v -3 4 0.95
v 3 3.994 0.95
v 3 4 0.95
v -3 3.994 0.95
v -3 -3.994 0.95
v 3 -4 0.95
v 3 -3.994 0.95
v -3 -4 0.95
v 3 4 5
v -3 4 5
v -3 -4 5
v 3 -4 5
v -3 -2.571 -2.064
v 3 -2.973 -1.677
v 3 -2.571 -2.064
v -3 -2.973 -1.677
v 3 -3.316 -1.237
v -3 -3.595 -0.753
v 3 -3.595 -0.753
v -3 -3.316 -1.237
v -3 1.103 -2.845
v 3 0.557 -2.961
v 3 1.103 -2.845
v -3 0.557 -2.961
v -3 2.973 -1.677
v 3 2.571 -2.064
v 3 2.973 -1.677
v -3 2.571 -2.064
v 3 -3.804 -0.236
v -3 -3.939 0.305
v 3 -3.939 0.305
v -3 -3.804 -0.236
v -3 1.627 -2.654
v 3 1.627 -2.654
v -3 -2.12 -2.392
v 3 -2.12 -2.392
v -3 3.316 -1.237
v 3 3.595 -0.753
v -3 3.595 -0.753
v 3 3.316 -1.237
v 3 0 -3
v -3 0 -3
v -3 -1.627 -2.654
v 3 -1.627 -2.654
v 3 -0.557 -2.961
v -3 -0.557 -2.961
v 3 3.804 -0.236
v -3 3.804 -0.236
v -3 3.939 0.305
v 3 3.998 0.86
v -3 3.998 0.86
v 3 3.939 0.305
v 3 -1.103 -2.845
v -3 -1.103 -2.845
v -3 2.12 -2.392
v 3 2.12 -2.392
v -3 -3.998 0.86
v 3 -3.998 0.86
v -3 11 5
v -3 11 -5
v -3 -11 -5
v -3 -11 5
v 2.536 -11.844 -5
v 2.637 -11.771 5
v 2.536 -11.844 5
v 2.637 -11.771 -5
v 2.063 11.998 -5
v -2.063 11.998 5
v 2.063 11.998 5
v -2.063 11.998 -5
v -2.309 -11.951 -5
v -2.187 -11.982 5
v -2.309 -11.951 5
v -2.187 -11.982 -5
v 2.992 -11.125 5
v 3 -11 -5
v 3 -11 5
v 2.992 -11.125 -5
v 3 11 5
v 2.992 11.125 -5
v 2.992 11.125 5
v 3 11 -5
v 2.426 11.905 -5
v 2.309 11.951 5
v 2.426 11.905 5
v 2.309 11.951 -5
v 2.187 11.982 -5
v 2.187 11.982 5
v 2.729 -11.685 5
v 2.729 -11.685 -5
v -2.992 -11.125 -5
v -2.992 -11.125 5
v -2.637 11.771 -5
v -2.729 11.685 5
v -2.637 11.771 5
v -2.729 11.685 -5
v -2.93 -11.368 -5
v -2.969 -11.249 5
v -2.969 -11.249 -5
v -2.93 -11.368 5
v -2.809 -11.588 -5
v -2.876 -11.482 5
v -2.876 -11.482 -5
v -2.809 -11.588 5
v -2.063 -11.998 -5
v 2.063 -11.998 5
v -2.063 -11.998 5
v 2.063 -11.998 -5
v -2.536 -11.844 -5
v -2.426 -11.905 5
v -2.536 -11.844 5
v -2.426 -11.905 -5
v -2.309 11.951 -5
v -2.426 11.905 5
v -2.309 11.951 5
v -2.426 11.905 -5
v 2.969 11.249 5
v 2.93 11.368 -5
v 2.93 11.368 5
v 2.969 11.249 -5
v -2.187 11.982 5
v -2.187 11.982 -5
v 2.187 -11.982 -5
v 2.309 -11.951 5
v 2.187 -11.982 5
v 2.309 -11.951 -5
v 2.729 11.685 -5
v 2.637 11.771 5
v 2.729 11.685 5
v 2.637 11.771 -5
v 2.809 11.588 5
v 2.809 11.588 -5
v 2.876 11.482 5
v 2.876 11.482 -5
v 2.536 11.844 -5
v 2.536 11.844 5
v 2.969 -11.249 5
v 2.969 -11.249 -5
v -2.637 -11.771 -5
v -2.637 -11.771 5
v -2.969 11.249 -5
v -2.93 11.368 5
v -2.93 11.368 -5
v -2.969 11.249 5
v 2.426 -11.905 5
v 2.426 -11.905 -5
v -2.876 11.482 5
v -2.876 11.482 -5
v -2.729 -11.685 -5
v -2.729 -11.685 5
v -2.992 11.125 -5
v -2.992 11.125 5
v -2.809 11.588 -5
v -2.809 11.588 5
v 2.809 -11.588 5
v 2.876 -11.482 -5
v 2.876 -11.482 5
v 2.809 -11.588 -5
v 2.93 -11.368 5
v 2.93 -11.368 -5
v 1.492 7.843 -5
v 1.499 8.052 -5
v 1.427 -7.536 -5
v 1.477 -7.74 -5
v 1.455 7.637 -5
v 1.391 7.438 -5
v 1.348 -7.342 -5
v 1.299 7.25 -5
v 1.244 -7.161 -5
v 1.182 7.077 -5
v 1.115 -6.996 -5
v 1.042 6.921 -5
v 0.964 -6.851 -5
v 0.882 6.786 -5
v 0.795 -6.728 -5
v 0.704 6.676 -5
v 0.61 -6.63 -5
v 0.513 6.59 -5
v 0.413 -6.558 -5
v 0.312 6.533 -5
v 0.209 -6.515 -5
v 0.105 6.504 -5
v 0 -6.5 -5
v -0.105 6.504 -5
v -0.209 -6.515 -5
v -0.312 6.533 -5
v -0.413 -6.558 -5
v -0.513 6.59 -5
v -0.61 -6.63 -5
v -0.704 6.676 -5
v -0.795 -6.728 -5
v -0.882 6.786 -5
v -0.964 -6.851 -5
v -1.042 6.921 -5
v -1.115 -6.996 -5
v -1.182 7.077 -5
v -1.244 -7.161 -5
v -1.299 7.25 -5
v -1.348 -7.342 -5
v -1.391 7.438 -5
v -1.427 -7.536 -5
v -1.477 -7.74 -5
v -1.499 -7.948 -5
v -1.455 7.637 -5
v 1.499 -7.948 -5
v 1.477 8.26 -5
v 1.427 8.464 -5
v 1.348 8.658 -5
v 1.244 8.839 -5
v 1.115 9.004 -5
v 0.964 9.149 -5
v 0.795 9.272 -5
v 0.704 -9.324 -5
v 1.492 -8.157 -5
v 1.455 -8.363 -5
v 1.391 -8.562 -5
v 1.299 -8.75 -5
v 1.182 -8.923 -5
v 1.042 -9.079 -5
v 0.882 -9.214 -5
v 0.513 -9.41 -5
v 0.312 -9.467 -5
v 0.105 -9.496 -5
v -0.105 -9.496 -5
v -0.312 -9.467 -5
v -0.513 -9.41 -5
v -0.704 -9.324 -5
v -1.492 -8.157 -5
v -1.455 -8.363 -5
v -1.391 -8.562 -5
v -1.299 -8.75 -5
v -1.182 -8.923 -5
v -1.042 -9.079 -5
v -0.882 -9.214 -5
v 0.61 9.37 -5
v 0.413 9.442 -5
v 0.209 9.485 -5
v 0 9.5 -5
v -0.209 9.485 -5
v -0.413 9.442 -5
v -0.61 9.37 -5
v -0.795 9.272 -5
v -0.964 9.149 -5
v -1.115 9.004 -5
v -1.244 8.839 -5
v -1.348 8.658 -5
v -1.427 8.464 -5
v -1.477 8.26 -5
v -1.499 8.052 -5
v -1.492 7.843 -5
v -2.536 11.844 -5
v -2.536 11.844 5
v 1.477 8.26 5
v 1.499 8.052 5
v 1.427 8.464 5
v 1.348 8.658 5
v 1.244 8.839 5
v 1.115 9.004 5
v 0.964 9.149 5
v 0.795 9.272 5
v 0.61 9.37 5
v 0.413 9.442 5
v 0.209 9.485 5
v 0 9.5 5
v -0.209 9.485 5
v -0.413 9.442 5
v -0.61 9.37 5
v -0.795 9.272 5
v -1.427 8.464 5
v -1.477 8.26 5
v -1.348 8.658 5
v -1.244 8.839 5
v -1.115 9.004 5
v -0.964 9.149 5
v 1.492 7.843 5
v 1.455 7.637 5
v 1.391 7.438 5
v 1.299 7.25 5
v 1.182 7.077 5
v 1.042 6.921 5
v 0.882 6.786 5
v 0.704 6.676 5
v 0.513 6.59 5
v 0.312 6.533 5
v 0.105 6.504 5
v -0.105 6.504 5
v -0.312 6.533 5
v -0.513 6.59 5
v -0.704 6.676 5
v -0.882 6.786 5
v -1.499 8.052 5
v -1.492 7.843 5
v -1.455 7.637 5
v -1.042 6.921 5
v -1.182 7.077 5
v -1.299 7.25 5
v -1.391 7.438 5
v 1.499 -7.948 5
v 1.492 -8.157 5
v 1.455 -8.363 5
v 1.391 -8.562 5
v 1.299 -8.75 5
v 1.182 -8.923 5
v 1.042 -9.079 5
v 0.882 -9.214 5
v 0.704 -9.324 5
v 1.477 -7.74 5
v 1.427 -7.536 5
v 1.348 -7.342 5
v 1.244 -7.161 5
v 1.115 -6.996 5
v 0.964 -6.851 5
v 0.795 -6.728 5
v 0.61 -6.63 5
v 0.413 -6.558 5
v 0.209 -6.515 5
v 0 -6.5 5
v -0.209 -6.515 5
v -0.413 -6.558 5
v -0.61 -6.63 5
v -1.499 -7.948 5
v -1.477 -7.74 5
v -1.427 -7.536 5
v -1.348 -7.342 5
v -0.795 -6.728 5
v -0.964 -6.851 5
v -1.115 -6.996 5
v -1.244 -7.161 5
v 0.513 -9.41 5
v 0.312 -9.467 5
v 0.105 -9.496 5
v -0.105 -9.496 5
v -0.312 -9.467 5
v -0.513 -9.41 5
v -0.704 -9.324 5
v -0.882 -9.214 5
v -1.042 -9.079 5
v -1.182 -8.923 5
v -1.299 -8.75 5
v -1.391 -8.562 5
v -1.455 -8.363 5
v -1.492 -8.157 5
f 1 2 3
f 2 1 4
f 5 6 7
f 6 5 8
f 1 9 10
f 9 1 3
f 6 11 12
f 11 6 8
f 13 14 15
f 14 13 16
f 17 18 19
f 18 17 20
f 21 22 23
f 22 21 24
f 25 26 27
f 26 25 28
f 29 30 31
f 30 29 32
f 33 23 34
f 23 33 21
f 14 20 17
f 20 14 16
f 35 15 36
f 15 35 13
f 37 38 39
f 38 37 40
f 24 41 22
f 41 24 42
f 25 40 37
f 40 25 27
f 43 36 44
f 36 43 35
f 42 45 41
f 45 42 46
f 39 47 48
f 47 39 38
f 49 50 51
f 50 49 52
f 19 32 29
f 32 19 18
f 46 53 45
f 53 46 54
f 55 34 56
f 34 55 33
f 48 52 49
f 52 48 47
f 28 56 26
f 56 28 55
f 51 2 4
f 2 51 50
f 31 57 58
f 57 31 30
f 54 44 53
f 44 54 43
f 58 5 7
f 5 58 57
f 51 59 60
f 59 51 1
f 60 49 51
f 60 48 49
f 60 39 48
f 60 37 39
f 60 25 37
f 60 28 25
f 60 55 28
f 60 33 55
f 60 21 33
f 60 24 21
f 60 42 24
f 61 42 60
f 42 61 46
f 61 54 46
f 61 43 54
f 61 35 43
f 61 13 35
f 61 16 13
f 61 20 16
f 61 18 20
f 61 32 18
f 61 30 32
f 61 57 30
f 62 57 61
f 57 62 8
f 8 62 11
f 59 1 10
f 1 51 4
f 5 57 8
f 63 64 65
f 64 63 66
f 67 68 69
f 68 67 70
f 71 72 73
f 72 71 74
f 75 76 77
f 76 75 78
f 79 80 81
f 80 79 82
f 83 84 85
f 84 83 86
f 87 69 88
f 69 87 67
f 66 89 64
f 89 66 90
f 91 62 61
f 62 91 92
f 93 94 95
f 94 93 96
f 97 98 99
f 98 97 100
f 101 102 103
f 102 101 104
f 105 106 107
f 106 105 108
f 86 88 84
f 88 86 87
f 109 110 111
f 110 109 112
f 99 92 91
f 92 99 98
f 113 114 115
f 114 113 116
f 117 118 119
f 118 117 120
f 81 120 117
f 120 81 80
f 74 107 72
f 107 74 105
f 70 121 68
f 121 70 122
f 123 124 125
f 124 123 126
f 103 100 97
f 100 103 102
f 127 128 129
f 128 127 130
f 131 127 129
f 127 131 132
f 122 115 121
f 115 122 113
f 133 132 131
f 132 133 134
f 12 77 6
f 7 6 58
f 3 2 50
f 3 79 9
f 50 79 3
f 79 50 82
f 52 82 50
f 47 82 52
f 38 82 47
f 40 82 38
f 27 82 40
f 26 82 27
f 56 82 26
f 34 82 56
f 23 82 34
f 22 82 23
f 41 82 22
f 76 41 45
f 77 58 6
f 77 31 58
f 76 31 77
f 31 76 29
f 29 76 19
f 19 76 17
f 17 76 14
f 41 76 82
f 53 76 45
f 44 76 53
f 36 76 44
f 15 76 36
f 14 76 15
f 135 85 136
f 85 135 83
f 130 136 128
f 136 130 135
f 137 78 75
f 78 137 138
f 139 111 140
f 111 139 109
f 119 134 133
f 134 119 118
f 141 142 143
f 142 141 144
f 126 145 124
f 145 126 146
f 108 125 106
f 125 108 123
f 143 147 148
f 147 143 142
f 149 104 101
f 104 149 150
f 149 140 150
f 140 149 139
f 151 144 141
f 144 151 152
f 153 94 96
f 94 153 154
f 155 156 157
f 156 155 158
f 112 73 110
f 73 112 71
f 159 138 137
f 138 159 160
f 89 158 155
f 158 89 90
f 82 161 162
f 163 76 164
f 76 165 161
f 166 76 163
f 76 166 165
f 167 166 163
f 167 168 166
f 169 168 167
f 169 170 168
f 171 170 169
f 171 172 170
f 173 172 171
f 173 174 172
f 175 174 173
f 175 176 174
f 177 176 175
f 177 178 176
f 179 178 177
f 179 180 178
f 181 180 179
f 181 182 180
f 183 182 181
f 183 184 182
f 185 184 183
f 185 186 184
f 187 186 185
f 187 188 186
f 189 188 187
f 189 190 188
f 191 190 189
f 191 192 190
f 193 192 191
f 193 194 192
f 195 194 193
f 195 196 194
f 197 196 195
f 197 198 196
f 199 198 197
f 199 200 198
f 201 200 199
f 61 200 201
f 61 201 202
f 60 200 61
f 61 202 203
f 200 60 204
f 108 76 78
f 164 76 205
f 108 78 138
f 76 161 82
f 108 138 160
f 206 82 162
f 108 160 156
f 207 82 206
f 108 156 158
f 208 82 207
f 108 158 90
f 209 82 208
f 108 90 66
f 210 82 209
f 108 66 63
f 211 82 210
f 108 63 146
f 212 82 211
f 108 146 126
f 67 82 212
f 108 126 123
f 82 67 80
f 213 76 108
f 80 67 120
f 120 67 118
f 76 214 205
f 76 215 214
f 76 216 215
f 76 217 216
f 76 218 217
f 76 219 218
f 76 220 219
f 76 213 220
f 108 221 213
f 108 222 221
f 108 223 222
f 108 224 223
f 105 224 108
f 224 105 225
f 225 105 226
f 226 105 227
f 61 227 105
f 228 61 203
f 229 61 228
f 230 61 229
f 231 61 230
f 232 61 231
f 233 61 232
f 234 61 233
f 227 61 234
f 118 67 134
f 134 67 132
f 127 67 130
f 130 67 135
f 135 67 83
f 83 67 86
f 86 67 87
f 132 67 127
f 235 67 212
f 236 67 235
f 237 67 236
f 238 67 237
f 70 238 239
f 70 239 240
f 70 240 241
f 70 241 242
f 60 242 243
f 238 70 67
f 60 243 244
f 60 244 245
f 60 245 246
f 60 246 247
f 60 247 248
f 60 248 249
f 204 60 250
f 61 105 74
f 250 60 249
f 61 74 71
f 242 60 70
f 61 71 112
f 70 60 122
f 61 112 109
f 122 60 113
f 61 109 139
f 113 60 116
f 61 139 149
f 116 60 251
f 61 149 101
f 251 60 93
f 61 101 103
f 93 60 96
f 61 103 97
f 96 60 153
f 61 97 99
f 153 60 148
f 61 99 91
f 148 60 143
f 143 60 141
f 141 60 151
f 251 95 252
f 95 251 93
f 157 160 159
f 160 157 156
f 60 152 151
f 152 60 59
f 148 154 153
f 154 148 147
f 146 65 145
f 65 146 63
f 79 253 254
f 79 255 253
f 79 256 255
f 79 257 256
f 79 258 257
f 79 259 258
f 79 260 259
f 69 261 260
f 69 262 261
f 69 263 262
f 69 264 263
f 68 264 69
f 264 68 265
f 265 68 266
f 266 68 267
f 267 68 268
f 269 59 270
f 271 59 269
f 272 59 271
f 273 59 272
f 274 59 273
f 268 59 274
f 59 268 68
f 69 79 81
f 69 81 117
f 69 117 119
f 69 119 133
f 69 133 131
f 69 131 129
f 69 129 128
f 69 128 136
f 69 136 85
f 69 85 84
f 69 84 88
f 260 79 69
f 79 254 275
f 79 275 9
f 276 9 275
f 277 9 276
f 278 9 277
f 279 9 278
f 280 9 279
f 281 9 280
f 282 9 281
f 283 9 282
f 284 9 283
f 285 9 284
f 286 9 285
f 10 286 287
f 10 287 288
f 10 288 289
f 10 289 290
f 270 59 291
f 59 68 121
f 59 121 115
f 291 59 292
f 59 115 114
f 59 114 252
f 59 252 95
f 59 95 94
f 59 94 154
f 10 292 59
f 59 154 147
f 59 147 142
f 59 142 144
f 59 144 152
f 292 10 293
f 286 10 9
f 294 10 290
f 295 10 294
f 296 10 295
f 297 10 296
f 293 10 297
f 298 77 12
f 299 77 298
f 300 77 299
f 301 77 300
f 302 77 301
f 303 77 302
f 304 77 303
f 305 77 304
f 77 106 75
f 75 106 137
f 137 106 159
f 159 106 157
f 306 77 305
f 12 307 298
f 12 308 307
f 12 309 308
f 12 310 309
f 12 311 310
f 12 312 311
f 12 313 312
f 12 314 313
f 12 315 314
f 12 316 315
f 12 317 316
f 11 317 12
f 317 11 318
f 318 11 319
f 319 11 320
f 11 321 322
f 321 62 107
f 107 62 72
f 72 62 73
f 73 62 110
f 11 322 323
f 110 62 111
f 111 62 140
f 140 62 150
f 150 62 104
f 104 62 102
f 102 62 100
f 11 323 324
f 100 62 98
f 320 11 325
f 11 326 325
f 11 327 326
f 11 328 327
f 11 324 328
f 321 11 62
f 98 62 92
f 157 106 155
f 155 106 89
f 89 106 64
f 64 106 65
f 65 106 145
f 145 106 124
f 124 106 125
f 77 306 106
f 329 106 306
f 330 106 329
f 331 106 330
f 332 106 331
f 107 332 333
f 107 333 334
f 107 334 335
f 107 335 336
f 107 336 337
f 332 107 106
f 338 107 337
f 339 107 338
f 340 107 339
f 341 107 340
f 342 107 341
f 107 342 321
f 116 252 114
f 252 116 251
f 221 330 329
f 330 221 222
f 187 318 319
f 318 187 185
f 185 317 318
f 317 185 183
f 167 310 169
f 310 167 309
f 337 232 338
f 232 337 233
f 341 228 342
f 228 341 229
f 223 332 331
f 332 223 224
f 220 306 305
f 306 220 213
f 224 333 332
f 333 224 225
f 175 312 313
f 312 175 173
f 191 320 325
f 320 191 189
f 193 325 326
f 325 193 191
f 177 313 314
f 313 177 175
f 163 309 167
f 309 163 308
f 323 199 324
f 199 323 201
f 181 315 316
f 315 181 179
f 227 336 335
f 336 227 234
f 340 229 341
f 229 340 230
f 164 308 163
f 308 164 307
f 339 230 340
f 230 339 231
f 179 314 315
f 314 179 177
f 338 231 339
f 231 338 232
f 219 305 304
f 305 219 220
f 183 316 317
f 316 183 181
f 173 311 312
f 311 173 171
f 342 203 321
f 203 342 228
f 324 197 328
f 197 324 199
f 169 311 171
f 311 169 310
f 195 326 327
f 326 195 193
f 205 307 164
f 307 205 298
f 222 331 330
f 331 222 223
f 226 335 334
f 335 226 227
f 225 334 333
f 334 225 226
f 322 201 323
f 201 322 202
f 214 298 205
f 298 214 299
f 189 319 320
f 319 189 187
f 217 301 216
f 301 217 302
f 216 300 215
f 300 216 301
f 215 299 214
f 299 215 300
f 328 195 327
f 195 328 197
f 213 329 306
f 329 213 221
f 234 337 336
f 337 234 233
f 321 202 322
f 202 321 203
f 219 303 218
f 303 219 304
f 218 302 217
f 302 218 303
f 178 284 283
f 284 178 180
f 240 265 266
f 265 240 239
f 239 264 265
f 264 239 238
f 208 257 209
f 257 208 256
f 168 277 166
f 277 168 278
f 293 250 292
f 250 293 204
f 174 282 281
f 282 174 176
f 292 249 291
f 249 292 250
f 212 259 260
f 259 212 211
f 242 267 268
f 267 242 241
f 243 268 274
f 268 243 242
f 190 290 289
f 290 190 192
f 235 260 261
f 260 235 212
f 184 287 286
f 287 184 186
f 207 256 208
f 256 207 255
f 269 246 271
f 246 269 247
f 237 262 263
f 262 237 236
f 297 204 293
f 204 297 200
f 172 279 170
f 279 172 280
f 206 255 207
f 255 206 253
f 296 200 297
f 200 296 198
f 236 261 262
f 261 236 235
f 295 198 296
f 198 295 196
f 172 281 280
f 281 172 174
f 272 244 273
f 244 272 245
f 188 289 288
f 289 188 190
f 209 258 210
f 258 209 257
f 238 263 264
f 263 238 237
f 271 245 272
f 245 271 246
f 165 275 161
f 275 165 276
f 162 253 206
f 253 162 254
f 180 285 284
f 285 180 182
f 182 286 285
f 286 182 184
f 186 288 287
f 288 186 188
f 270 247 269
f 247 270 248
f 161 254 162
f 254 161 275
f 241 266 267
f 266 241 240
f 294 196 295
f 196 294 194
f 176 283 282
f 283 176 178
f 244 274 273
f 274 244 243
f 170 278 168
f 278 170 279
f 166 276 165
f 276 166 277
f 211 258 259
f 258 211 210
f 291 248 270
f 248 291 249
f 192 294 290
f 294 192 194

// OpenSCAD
//*** Parametric cable clamp ***
//Bertrand Achard - Creative Common attribution share alike.

//v1.0 (21/12/2012) : Initial release
//v1.1 (24/12/2012) : Adds full-clamp setup (see below)
//v1.2 (25/12/2012) : Added rounded corners (using minkowski)

//The design assumes that the diameter of the screws is smaller than the cable.

//Two possible setups :
//
//1) Half-clamp (you can join 2 together to hold the cable)
//Factor 1.1 = presses the cable by 10%
//cable_press=cable_diam*0.5*1.1;
//cube_z=cable_diam*1.5;
//
//2) Full-clamp (you can screw the clamp to a flat surface)
//Factor 0.1 = presses the cable by 10%
//cable_press=cable_diam*0.1;
//cube_z=cable_diam*2.5;

//Diameter of the cable
cable_diam=8;
//Diameter of the 2 screws
screw_diam=3;
//How much you want the cable to be "pressed" (shifts the cable hole on the Z axis)
cable_press=cable_diam*0*1;

//The height of the cube (z axis)
cube_z=cable_diam*2.5;
//The depth of the cube (x axis), min=screw_diam+some margin
cube_x=screw_diam*4;
//The width of the cube (y axis), min=6
cube_y=cable_diam*6;

//Do not set this to 0, or remove the minkowski.
//Setting this to 0 will remove the cylinder in the minkowski, disabling it, and
//the corrections used for the minkowski will introduce an error.
cube_roundness=cable_diam/4;

difference()
{
	//-0.5 in translate and -1 in cube Z corrects for the error added by minkowski with cylinder h=1.
	translate([0,0,-0.5]) minkowski()
	{
		cube([cube_x/2-cube_roundness,cube_y/2-cube_roundness,cube_z/2-1], true);
		cylinder(r=cube_roundness/2,h=1,$fn=50);
	}

	translate([0,0,cube_z/4-cable_diam/2+cable_press]) union() {
		translate([0,0,cable_diam/4]) cube([cube_x/2+1, cable_diam, cable_diam/2+0.1], true);
		rotate([0,90,0])
			cylinder(h=cube_x/2+1, r1=cable_diam/2, r2=cable_diam/2, center=true, $fn=screw_diam*15);
	}

	translate([0,-cube_y/8-cable_diam/4,0])
		rotate([0,0,90])
			cylinder(h=cube_z, r1=screw_diam/2, r2=screw_diam/2, center=true, $fn=screw_diam*15);

	translate([0,cube_y/8+cable_diam/4,0])
		rotate([0,0,90])
			cylinder(h=cube_z, r1=screw_diam/2, r2=screw_diam/2, center=true, $fn=screw_diam*15);
}
